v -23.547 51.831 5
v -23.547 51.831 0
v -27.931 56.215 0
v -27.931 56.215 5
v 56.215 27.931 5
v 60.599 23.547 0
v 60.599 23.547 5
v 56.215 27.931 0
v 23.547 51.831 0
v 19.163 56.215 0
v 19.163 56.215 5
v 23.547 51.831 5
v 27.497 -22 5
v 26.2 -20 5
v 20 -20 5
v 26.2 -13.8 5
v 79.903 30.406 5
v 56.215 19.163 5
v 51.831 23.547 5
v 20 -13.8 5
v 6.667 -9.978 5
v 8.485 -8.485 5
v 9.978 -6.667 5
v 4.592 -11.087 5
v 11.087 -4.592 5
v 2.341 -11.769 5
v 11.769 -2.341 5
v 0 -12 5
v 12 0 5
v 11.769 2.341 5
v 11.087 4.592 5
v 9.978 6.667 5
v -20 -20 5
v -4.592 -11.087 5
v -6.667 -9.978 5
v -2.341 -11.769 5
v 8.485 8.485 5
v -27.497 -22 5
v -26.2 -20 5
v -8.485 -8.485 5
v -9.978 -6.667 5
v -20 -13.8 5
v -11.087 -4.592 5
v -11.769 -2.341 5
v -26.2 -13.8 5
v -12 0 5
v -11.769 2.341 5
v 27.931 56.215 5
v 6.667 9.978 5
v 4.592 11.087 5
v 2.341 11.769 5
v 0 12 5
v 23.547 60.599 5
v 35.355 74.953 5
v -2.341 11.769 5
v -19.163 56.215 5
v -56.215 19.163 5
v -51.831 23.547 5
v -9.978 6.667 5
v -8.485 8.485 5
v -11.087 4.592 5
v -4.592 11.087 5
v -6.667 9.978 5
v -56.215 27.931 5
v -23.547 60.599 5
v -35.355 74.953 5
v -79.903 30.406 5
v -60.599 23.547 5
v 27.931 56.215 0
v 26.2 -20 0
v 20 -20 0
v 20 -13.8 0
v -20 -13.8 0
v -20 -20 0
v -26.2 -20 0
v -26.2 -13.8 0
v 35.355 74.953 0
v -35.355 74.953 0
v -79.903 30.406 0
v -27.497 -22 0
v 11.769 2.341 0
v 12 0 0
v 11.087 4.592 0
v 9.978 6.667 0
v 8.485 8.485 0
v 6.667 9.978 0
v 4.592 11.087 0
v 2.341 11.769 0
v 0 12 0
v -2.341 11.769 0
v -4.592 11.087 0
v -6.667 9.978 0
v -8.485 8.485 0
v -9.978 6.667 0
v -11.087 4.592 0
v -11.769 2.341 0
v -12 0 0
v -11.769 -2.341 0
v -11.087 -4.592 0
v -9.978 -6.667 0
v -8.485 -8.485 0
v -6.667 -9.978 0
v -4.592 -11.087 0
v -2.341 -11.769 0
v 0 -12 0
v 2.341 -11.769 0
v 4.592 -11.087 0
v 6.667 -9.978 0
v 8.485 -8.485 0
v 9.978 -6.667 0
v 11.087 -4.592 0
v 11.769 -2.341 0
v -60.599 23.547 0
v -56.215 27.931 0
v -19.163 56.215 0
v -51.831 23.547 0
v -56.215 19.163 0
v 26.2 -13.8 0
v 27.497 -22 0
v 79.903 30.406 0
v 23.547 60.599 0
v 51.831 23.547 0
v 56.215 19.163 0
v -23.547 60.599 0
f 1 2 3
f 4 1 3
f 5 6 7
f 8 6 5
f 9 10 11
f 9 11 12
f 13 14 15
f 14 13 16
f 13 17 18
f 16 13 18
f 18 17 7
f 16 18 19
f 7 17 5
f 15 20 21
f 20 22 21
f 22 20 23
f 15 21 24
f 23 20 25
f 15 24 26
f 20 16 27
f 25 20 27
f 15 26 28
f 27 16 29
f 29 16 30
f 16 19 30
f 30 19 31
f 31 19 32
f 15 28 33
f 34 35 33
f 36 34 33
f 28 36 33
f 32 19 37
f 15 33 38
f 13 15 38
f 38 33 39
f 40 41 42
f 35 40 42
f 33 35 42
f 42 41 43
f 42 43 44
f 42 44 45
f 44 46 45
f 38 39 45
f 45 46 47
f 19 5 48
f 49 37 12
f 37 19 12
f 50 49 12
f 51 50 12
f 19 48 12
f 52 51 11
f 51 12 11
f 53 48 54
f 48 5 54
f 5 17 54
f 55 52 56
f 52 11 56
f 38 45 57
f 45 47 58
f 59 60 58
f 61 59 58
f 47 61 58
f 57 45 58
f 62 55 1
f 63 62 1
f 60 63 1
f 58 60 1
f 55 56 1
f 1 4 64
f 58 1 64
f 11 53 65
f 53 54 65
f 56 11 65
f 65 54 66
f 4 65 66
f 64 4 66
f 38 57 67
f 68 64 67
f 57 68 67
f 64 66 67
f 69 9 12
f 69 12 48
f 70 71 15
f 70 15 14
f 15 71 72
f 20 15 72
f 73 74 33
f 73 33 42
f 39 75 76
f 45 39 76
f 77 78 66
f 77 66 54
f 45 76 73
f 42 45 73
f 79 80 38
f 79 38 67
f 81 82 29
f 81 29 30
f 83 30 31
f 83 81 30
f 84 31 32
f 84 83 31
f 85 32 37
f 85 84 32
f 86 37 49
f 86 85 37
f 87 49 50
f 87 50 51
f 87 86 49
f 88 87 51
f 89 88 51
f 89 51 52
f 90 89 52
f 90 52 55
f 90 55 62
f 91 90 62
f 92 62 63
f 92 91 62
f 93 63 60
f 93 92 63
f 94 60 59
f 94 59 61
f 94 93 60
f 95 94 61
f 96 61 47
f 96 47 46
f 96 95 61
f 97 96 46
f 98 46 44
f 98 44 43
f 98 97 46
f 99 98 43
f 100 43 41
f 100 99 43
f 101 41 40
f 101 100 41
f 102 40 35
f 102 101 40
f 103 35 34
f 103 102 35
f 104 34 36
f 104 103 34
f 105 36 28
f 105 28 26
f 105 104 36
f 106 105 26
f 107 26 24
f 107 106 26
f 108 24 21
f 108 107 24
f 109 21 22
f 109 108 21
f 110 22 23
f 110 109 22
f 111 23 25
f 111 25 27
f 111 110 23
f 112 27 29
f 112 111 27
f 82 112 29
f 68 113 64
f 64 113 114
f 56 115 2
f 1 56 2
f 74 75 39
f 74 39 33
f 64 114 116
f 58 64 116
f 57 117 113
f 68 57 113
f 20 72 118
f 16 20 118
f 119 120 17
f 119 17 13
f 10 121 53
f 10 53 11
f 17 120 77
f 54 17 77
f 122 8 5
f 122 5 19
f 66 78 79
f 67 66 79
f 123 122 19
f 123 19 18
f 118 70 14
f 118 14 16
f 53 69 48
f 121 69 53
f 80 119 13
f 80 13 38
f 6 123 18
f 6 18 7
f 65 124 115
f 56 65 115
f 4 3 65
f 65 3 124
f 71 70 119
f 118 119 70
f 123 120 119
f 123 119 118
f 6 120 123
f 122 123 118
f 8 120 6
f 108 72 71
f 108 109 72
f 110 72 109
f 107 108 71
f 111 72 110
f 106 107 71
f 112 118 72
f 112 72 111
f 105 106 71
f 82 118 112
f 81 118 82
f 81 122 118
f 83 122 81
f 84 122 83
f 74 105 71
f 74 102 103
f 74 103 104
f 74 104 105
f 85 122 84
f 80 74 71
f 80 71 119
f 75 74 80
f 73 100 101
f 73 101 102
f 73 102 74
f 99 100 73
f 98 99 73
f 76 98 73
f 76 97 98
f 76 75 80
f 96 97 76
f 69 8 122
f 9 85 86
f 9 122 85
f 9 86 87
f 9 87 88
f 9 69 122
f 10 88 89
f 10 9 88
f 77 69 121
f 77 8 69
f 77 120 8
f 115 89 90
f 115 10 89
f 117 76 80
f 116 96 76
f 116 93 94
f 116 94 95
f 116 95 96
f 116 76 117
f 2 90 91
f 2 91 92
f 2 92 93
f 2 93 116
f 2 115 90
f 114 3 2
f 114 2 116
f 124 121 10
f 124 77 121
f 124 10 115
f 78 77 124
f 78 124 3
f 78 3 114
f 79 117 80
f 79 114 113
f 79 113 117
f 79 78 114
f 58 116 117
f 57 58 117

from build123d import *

# Parameters (mm, degrees)
SKETCH3_R           = 12
SKETCH3_W           = 6.2
SKETCH3_H           = 6.2
BOSS_EXTRUDE1_DEPTH = 5


with BuildPart() as part:
    # Sketch3 → Boss-Extrude1 (new body)
    with BuildSketch(Plane.XY):
        Polygon((-69.296464556, 41.012193309), (-41.012193309, 69.296464556), (-35.355339059, 74.953318806), (35.355339059, 74.953318806), (41.012193309, 69.296464556), (69.296464556, 41.012193309), (79.903066274, 30.405591591), (27.497474683, -22), (-27.497474683, -22), (-79.903066274, 30.405591591), align=None)
        Circle(SKETCH3_R, mode=Mode.SUBTRACT)
        Polygon((-60.599051148, 23.546655814), (-56.214989104, 27.930717857), (-51.830927061, 23.546655814), (-56.214989104, 19.16259377), align=None, mode=Mode.SUBTRACT)
        Polygon((-27.930717857, 56.214989104), (-23.546655814, 60.599051148), (-19.16259377, 56.214989104), (-23.546655814, 51.830927061), align=None, mode=Mode.SUBTRACT)
        Polygon((19.16259377, 56.214989104), (23.546655814, 51.830927061), (27.930717857, 56.214989104), (23.546655814, 60.599051148), align=None, mode=Mode.SUBTRACT)
        with Locations((-23.1, -16.9)):
            Rectangle(SKETCH3_W, SKETCH3_H, mode=Mode.SUBTRACT)
        Polygon((51.830927061, 23.546655814), (56.214989104, 19.16259377), (60.599051148, 23.546655814), (56.214989104, 27.930717857), align=None, mode=Mode.SUBTRACT)
        with Locations((23.1, -16.9)):
            Rectangle(SKETCH3_W, SKETCH3_H, mode=Mode.SUBTRACT)
    extrude(amount=BOSS_EXTRUDE1_DEPTH)


solid = part.part
